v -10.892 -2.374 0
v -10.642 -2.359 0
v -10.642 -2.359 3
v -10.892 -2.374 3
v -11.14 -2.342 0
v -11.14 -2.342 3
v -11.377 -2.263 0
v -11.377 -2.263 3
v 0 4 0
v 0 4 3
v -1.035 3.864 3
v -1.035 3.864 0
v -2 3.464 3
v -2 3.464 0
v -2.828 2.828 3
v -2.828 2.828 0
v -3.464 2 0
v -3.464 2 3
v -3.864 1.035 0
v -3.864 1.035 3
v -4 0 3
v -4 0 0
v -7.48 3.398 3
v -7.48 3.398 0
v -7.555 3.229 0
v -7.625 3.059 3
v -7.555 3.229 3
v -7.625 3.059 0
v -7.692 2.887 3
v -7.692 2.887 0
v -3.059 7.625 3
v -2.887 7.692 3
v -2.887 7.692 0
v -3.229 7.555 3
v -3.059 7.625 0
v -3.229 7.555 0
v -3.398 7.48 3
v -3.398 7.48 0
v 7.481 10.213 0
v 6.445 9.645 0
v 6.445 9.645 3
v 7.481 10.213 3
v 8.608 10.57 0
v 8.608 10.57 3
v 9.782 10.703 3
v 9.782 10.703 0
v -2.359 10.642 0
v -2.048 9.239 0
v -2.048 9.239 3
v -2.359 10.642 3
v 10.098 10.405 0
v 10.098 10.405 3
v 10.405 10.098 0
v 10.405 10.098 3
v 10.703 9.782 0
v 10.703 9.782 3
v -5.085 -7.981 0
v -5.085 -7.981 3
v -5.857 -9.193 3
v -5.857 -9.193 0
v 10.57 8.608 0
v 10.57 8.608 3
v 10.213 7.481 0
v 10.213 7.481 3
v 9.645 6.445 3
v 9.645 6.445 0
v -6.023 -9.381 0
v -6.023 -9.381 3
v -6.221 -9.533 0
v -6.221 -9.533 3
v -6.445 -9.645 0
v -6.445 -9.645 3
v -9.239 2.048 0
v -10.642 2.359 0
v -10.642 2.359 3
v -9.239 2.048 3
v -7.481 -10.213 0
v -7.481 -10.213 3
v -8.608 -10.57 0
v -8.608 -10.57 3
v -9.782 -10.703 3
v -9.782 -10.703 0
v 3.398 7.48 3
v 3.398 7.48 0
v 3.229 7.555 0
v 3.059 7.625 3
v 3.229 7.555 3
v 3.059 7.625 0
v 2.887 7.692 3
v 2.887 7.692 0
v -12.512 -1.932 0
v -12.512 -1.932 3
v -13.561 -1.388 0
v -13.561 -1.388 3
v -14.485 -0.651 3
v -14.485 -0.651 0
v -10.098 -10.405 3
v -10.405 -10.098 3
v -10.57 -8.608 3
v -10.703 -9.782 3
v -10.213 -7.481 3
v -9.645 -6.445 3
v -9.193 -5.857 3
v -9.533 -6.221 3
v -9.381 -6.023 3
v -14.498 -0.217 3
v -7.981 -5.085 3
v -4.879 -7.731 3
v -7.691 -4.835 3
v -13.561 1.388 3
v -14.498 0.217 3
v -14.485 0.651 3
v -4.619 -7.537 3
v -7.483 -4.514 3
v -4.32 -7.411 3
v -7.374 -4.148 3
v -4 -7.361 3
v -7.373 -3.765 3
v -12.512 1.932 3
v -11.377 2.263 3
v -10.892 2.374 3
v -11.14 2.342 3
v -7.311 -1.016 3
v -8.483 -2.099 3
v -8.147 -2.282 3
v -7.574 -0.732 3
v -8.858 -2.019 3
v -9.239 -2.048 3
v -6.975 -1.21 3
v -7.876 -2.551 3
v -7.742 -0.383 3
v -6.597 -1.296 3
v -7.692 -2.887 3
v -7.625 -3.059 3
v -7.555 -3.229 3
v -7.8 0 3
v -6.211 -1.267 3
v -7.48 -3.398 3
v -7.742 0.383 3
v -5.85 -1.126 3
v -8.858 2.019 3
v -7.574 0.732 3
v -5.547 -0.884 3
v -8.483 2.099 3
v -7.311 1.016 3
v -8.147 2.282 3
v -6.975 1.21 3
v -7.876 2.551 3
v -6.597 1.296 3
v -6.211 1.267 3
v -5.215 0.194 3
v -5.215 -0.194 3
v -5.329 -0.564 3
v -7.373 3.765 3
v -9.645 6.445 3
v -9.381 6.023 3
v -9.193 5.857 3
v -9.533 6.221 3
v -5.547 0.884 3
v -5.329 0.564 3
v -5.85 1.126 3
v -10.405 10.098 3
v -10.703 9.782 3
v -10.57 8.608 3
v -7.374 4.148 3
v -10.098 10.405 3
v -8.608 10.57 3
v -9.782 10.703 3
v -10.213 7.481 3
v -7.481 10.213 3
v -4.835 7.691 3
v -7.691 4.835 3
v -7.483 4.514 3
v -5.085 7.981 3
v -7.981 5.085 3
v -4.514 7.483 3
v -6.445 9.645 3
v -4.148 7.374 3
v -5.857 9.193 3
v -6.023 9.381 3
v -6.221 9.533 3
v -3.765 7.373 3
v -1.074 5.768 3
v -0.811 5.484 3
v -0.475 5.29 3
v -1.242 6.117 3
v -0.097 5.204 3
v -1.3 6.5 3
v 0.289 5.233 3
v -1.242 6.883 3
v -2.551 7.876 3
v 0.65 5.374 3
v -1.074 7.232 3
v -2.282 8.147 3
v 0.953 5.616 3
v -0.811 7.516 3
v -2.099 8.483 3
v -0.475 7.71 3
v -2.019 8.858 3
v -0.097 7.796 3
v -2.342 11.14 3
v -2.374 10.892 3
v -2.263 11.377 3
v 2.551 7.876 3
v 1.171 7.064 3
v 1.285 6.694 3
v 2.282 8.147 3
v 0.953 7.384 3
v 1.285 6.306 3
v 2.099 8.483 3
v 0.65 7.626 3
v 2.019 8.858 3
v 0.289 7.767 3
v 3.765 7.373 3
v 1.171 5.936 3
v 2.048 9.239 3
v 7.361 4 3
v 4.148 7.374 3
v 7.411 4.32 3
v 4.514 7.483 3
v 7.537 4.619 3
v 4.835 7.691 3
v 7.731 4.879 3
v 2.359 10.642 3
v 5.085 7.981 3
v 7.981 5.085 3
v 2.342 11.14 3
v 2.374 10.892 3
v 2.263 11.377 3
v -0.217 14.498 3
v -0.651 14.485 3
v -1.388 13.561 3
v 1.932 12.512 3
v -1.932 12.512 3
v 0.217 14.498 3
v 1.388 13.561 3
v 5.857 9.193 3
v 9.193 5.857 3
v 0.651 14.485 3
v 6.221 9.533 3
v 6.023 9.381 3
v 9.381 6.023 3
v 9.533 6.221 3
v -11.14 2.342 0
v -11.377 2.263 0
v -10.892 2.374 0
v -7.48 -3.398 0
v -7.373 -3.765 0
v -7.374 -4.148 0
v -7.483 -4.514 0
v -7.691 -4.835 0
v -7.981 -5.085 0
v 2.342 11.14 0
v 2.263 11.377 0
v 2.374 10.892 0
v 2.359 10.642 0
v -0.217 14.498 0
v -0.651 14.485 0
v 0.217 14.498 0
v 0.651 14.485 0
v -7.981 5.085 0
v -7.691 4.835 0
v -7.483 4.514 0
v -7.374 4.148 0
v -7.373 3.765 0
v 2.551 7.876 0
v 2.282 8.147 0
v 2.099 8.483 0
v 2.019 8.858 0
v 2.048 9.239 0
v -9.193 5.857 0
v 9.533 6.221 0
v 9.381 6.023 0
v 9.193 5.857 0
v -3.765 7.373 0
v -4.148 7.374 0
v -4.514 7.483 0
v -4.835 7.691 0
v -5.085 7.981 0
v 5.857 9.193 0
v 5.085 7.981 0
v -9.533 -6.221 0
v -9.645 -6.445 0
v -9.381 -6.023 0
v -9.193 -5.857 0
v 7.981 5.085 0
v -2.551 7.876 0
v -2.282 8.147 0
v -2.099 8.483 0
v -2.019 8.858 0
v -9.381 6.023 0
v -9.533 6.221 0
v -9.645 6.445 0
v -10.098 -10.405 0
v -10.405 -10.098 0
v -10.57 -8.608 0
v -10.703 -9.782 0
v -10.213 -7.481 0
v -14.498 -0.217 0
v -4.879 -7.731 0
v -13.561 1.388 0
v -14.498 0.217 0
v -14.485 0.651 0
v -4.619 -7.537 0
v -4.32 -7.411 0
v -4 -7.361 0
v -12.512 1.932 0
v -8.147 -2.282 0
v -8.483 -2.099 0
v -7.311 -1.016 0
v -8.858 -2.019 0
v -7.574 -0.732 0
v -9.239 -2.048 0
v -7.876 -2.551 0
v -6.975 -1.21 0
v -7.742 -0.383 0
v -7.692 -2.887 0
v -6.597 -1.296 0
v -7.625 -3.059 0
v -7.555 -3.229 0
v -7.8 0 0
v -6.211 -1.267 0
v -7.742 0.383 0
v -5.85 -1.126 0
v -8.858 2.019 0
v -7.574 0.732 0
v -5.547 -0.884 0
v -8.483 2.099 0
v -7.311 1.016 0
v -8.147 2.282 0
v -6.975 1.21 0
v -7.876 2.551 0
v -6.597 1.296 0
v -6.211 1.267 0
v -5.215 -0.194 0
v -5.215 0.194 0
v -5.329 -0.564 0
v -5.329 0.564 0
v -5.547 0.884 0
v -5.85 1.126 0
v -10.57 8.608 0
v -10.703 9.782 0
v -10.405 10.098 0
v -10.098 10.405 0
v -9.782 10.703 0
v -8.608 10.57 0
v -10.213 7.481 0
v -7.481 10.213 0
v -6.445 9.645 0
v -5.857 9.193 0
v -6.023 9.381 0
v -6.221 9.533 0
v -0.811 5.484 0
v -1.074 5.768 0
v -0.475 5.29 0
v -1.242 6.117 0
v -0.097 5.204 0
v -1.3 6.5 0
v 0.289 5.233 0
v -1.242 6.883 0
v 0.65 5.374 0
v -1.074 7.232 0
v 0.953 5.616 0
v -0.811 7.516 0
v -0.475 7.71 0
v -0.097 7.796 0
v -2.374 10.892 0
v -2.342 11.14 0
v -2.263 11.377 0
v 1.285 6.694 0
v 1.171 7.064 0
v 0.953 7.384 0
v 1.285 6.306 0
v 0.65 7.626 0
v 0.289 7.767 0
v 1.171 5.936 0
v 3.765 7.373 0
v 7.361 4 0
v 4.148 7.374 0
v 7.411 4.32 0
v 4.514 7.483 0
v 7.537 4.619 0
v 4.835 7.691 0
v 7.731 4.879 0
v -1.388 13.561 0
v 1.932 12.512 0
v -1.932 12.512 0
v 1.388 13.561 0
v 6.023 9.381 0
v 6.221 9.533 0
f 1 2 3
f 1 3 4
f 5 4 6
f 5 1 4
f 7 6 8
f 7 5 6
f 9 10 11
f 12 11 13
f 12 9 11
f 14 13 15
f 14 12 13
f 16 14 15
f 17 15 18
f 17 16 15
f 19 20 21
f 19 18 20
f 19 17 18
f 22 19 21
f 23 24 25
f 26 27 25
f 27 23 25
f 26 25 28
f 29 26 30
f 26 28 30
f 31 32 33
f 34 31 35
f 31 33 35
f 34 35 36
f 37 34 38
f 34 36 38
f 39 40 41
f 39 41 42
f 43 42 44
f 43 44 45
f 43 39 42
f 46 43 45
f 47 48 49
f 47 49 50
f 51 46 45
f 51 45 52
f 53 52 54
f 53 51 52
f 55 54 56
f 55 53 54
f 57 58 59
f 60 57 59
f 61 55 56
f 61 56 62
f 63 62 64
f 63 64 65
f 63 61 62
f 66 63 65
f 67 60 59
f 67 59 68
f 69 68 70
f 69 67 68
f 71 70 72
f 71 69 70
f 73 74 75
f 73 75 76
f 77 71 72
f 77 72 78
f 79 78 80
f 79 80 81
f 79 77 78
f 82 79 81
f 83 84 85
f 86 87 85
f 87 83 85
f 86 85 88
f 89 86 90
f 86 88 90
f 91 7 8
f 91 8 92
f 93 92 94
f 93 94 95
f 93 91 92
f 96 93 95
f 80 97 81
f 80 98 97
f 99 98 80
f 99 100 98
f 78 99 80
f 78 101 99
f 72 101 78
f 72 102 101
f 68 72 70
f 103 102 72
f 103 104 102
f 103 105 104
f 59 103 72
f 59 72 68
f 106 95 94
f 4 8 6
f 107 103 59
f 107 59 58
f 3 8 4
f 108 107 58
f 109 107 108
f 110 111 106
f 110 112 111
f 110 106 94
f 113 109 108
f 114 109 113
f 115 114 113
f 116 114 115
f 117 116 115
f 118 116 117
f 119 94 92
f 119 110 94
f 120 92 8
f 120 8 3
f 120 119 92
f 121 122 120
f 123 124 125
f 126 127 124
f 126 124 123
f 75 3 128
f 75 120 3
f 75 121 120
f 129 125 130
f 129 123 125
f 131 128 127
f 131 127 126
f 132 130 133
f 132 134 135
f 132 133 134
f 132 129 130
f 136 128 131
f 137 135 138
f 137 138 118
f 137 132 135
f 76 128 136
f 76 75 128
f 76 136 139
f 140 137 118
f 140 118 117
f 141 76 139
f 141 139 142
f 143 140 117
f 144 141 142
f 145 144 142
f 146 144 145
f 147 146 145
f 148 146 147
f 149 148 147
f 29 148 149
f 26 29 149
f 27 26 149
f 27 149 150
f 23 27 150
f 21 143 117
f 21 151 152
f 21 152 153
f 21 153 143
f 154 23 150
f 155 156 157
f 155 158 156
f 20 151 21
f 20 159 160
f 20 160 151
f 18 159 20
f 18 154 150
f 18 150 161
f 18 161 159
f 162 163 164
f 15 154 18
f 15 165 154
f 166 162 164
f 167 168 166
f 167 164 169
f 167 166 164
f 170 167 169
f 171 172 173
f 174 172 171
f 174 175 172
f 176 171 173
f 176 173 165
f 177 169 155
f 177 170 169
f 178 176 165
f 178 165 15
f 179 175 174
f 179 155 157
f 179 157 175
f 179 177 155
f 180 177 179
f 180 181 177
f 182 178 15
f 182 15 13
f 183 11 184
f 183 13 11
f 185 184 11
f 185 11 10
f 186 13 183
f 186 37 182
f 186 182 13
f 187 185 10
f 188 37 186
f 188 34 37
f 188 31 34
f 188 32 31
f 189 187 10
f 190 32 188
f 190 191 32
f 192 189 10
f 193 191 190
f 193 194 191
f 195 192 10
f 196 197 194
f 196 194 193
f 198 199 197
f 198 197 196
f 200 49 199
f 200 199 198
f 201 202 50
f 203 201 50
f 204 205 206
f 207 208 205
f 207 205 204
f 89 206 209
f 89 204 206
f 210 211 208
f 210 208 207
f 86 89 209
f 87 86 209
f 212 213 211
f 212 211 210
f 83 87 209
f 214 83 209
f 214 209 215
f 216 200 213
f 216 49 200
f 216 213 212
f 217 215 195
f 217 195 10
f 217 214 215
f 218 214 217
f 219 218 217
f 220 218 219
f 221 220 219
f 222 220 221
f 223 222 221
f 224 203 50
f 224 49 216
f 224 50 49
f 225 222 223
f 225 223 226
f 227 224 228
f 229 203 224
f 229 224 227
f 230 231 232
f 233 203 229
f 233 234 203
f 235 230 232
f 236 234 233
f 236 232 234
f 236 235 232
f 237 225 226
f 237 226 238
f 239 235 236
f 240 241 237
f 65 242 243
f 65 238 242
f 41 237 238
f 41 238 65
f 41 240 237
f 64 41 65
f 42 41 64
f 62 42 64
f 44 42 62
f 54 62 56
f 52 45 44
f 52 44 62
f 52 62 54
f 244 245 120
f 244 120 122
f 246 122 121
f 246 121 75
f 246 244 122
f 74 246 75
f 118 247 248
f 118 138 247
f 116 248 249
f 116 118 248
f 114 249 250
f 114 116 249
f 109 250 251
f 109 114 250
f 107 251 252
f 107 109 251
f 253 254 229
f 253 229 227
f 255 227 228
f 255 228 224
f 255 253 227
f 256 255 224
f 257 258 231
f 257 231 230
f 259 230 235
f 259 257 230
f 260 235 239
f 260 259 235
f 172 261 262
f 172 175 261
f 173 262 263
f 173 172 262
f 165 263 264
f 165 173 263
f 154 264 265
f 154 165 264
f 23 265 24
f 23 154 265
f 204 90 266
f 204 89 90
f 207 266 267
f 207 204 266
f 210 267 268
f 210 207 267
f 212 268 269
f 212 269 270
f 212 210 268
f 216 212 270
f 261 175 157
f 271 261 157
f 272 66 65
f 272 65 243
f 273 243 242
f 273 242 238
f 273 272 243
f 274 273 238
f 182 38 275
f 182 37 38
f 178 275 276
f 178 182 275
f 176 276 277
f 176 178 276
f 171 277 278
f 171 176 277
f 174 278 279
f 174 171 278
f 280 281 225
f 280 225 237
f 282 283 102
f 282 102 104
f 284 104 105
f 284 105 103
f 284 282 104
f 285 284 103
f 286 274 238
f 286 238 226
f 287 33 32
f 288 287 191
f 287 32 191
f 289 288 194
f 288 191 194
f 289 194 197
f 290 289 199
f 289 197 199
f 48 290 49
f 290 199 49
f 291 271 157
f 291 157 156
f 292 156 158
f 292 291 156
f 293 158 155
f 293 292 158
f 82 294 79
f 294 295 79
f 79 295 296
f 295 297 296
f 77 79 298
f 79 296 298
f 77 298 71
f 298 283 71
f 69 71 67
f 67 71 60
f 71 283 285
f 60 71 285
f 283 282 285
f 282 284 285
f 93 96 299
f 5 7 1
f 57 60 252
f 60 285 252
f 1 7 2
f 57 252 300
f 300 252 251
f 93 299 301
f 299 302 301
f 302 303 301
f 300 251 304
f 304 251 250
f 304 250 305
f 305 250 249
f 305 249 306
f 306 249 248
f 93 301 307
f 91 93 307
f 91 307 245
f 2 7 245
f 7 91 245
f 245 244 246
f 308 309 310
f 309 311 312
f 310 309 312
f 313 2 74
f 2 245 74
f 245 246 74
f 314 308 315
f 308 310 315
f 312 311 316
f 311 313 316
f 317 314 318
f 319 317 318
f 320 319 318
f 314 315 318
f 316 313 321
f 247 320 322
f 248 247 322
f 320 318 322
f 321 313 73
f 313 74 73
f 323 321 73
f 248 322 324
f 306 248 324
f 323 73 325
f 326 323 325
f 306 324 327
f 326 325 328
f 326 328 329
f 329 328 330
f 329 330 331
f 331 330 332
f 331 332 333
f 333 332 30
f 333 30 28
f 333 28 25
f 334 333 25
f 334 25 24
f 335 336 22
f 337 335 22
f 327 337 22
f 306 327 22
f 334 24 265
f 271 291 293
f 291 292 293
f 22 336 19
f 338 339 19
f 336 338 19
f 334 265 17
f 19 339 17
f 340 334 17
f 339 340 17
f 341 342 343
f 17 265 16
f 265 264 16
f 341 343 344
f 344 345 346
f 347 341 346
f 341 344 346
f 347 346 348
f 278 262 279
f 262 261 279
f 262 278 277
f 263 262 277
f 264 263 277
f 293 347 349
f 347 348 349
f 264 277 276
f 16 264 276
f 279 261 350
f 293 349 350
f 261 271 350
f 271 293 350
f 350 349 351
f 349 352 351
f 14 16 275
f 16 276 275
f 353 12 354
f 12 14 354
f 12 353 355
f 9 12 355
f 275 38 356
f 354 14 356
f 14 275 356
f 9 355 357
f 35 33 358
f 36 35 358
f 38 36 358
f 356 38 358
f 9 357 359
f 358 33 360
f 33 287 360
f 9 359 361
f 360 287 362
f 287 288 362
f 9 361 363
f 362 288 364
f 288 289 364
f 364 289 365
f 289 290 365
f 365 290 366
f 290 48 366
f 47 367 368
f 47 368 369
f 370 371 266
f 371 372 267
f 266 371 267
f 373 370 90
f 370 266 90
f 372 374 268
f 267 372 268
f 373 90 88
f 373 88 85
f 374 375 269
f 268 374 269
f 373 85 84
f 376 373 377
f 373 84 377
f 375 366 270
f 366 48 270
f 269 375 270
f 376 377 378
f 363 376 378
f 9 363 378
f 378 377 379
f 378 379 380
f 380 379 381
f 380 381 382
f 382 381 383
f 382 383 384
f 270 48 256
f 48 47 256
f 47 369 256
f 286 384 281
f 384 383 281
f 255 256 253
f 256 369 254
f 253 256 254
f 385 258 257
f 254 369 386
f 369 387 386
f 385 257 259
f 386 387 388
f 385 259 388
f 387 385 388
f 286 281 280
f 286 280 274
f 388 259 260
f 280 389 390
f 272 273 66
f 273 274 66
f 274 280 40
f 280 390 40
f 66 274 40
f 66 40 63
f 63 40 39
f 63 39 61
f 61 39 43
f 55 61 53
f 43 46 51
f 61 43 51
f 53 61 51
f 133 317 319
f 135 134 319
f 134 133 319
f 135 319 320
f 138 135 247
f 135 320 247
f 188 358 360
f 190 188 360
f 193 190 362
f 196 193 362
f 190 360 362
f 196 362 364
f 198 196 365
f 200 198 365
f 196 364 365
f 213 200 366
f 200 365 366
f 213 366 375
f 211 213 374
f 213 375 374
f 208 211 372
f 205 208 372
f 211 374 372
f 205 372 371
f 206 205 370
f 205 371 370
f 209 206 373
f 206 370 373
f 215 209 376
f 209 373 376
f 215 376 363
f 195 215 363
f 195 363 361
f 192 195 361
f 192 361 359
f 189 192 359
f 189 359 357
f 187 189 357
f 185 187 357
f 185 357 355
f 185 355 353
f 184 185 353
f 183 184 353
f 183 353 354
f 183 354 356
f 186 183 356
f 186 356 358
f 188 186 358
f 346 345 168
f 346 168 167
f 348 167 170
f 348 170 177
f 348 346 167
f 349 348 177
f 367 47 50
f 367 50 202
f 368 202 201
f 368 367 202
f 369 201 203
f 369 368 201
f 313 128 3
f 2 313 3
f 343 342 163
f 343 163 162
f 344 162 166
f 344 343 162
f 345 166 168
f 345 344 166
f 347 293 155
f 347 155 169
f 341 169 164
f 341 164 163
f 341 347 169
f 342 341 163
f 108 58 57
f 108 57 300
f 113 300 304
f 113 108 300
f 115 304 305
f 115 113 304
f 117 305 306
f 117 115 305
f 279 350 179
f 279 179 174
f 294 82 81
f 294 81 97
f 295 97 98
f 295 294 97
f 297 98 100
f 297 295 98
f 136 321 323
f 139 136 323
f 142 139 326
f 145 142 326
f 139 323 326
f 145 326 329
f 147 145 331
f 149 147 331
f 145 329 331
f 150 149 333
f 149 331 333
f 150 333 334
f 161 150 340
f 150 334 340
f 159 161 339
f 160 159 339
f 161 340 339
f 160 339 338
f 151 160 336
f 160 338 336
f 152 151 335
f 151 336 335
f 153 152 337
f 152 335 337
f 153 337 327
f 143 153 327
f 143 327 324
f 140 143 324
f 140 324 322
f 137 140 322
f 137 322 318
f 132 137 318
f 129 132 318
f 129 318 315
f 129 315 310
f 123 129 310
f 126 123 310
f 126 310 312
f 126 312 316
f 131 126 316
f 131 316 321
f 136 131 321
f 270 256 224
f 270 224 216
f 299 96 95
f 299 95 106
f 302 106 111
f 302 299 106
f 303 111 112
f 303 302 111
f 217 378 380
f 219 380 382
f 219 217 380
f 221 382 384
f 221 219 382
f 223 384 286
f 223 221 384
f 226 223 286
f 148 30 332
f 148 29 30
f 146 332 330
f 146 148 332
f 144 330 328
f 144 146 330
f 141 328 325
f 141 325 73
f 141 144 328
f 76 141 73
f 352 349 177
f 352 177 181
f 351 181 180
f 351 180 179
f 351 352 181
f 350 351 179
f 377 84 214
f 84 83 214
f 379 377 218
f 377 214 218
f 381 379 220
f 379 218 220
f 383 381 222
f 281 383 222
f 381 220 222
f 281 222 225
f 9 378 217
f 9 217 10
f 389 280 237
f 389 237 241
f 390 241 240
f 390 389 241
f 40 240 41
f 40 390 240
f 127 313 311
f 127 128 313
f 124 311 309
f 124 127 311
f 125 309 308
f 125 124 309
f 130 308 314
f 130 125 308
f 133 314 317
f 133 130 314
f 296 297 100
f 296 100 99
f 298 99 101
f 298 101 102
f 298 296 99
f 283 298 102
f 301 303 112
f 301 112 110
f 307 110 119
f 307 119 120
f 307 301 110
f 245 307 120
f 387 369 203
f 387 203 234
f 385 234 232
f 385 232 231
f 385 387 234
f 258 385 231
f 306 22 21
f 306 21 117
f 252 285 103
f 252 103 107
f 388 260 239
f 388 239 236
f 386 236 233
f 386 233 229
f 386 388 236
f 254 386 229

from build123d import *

# Parameters (mm, degrees)
POSICIONAMENTOS_R               = 8.2157
BASE_DEPTH                      = 3
FURO_DE_DI_METRO_2_6_2_6_1_D    = 2.6
BASE_DENTE_DEPTH                = 3
RAIO_DENTE_R                    = 1.342367201
PADR_OCIRCULAR1_COUNT           = 8
RAIO_DENTE_OF_PADR_OCIRCULAR1_R = 1.342367201
FURO_DE_DI_METRO_3_0_3_1_D      = 3
CORTE_EXTRUS_O1_DEPTH           = 21.724381776


with BuildPart() as part:
    # Posicionamentos → Base (new body)
    with BuildSketch(Plane.XY):
        Circle(POSICIONAMENTOS_R)
    extrude(amount=BASE_DEPTH)

    # Furo de diâmetro Ø2.6 (2.6)1 (through all)
    with Locations(Plane.XY.offset(3)):
        with Locations((0, 6.5), (-6.5, 0)):
            Hole(FURO_DE_DI_METRO_2_6_2_6_1_D / 2)

    # Dente → Base Dente (add, through all)
    with BuildSketch(Plane.XY):
        with BuildLine():
            Line((2.358922349, 10.642131153), (1.777928991, 8.021015833))
            ThreePointArc((1.777928991, 8.021015833), (0, 8.2157), (-1.777928991, 8.021015833))
            Line((-1.777928991, 8.021015833), (-2.358922349, 10.642131153))
            ThreePointArc((-2.358922349, 10.642131153), (-2.364262787, 11.016570047), (-2.263047735, 11.377109253))
            ThreePointArc((-2.263047735, 11.377109253), (-1.685191659, 13.049606095), (-0.650923694, 14.48538223))
            ThreePointArc((-0.650923694, 14.48538223), (0, 14.5), (0.650923694, 14.48538223))
            ThreePointArc((0.650923694, 14.48538223), (1.685191659, 13.049606095), (2.263047735, 11.377109253))
            ThreePointArc((2.263047735, 11.377109253), (2.364262787, 11.016570047), (2.358922349, 10.642131153))
        make_face()
    base_dente = extrude(amount=BASE_DENTE_DEPTH)

    # Raio Dente
    raio_dente_edges = [part.edges().sort_by_distance(p)[0] for p in [
        (-1.777928991, 8.021015833, 1.5),
        (1.777928991, 8.021015833, 1.5),
    ]]
    fillet(raio_dente_edges, radius=RAIO_DENTE_R)

    # PadrãoCircular1: Base Dente ×8 about axis
    padr_ocircular1_axis = Axis((0, 0, 0), (0, 0, 1))
    for i in range(1, PADR_OCIRCULAR1_COUNT):
        add(base_dente.rotate(padr_ocircular1_axis, i * 360 / PADR_OCIRCULAR1_COUNT))

    # Raio Dente of PadrãoCircular1
    raio_dente_of_padr_ocircular1_edges = [part.edges().sort_by_distance(p)[0] for p in [
        (-6.928900334, 4.414529041, 1.5),
        (-4.414529041, 6.928900334, 1.5),
        (-8.021015833, -1.777928991, 1.5),
        (-8.021015833, 1.777928991, 1.5),
        (-4.414529041, -6.928900334, 1.5),
        (-6.928900334, -4.414529041, 1.5),
        (1.777928991, -8.021015833, 1.5),
        (-1.777928991, -8.021015833, 1.5),
        (6.928900334, -4.414529041, 1.5),
        (4.414529041, -6.928900334, 1.5),
        (8.021015833, 1.777928991, 1.5),
        (8.021015833, -1.777928991, 1.5),
        (4.414529041, 6.928900334, 1.5),
        (6.928900334, 4.414529041, 1.5),
    ]]
    fillet(raio_dente_of_padr_ocircular1_edges, radius=RAIO_DENTE_OF_PADR_OCIRCULAR1_R)

    # Furo de diâmetro Ø3.0 (3)1 (through all)
    with Locations(Plane.XY.offset(3)):
        with Locations((0, 0)):
            Hole(FURO_DE_DI_METRO_3_0_3_1_D / 2)

    # Encaixe → Corte-extrusão1 (cut, through all)
    with BuildSketch(Plane.XY):
        with BuildLine():
            Line((-4, 0), (-4, -13.937359865))
            ThreePointArc((-4, -13.937359865), (10.253048327, -10.253048327), (13.937359865, 4))
            Line((13.937359865, 4), (0, 4))
            ThreePointArc((0, 4), (-2.828427125, 2.828427125), (-4, 0))
        make_face()
    extrude(amount=CORTE_EXTRUS_O1_DEPTH, mode=Mode.SUBTRACT)


solid = part.part
